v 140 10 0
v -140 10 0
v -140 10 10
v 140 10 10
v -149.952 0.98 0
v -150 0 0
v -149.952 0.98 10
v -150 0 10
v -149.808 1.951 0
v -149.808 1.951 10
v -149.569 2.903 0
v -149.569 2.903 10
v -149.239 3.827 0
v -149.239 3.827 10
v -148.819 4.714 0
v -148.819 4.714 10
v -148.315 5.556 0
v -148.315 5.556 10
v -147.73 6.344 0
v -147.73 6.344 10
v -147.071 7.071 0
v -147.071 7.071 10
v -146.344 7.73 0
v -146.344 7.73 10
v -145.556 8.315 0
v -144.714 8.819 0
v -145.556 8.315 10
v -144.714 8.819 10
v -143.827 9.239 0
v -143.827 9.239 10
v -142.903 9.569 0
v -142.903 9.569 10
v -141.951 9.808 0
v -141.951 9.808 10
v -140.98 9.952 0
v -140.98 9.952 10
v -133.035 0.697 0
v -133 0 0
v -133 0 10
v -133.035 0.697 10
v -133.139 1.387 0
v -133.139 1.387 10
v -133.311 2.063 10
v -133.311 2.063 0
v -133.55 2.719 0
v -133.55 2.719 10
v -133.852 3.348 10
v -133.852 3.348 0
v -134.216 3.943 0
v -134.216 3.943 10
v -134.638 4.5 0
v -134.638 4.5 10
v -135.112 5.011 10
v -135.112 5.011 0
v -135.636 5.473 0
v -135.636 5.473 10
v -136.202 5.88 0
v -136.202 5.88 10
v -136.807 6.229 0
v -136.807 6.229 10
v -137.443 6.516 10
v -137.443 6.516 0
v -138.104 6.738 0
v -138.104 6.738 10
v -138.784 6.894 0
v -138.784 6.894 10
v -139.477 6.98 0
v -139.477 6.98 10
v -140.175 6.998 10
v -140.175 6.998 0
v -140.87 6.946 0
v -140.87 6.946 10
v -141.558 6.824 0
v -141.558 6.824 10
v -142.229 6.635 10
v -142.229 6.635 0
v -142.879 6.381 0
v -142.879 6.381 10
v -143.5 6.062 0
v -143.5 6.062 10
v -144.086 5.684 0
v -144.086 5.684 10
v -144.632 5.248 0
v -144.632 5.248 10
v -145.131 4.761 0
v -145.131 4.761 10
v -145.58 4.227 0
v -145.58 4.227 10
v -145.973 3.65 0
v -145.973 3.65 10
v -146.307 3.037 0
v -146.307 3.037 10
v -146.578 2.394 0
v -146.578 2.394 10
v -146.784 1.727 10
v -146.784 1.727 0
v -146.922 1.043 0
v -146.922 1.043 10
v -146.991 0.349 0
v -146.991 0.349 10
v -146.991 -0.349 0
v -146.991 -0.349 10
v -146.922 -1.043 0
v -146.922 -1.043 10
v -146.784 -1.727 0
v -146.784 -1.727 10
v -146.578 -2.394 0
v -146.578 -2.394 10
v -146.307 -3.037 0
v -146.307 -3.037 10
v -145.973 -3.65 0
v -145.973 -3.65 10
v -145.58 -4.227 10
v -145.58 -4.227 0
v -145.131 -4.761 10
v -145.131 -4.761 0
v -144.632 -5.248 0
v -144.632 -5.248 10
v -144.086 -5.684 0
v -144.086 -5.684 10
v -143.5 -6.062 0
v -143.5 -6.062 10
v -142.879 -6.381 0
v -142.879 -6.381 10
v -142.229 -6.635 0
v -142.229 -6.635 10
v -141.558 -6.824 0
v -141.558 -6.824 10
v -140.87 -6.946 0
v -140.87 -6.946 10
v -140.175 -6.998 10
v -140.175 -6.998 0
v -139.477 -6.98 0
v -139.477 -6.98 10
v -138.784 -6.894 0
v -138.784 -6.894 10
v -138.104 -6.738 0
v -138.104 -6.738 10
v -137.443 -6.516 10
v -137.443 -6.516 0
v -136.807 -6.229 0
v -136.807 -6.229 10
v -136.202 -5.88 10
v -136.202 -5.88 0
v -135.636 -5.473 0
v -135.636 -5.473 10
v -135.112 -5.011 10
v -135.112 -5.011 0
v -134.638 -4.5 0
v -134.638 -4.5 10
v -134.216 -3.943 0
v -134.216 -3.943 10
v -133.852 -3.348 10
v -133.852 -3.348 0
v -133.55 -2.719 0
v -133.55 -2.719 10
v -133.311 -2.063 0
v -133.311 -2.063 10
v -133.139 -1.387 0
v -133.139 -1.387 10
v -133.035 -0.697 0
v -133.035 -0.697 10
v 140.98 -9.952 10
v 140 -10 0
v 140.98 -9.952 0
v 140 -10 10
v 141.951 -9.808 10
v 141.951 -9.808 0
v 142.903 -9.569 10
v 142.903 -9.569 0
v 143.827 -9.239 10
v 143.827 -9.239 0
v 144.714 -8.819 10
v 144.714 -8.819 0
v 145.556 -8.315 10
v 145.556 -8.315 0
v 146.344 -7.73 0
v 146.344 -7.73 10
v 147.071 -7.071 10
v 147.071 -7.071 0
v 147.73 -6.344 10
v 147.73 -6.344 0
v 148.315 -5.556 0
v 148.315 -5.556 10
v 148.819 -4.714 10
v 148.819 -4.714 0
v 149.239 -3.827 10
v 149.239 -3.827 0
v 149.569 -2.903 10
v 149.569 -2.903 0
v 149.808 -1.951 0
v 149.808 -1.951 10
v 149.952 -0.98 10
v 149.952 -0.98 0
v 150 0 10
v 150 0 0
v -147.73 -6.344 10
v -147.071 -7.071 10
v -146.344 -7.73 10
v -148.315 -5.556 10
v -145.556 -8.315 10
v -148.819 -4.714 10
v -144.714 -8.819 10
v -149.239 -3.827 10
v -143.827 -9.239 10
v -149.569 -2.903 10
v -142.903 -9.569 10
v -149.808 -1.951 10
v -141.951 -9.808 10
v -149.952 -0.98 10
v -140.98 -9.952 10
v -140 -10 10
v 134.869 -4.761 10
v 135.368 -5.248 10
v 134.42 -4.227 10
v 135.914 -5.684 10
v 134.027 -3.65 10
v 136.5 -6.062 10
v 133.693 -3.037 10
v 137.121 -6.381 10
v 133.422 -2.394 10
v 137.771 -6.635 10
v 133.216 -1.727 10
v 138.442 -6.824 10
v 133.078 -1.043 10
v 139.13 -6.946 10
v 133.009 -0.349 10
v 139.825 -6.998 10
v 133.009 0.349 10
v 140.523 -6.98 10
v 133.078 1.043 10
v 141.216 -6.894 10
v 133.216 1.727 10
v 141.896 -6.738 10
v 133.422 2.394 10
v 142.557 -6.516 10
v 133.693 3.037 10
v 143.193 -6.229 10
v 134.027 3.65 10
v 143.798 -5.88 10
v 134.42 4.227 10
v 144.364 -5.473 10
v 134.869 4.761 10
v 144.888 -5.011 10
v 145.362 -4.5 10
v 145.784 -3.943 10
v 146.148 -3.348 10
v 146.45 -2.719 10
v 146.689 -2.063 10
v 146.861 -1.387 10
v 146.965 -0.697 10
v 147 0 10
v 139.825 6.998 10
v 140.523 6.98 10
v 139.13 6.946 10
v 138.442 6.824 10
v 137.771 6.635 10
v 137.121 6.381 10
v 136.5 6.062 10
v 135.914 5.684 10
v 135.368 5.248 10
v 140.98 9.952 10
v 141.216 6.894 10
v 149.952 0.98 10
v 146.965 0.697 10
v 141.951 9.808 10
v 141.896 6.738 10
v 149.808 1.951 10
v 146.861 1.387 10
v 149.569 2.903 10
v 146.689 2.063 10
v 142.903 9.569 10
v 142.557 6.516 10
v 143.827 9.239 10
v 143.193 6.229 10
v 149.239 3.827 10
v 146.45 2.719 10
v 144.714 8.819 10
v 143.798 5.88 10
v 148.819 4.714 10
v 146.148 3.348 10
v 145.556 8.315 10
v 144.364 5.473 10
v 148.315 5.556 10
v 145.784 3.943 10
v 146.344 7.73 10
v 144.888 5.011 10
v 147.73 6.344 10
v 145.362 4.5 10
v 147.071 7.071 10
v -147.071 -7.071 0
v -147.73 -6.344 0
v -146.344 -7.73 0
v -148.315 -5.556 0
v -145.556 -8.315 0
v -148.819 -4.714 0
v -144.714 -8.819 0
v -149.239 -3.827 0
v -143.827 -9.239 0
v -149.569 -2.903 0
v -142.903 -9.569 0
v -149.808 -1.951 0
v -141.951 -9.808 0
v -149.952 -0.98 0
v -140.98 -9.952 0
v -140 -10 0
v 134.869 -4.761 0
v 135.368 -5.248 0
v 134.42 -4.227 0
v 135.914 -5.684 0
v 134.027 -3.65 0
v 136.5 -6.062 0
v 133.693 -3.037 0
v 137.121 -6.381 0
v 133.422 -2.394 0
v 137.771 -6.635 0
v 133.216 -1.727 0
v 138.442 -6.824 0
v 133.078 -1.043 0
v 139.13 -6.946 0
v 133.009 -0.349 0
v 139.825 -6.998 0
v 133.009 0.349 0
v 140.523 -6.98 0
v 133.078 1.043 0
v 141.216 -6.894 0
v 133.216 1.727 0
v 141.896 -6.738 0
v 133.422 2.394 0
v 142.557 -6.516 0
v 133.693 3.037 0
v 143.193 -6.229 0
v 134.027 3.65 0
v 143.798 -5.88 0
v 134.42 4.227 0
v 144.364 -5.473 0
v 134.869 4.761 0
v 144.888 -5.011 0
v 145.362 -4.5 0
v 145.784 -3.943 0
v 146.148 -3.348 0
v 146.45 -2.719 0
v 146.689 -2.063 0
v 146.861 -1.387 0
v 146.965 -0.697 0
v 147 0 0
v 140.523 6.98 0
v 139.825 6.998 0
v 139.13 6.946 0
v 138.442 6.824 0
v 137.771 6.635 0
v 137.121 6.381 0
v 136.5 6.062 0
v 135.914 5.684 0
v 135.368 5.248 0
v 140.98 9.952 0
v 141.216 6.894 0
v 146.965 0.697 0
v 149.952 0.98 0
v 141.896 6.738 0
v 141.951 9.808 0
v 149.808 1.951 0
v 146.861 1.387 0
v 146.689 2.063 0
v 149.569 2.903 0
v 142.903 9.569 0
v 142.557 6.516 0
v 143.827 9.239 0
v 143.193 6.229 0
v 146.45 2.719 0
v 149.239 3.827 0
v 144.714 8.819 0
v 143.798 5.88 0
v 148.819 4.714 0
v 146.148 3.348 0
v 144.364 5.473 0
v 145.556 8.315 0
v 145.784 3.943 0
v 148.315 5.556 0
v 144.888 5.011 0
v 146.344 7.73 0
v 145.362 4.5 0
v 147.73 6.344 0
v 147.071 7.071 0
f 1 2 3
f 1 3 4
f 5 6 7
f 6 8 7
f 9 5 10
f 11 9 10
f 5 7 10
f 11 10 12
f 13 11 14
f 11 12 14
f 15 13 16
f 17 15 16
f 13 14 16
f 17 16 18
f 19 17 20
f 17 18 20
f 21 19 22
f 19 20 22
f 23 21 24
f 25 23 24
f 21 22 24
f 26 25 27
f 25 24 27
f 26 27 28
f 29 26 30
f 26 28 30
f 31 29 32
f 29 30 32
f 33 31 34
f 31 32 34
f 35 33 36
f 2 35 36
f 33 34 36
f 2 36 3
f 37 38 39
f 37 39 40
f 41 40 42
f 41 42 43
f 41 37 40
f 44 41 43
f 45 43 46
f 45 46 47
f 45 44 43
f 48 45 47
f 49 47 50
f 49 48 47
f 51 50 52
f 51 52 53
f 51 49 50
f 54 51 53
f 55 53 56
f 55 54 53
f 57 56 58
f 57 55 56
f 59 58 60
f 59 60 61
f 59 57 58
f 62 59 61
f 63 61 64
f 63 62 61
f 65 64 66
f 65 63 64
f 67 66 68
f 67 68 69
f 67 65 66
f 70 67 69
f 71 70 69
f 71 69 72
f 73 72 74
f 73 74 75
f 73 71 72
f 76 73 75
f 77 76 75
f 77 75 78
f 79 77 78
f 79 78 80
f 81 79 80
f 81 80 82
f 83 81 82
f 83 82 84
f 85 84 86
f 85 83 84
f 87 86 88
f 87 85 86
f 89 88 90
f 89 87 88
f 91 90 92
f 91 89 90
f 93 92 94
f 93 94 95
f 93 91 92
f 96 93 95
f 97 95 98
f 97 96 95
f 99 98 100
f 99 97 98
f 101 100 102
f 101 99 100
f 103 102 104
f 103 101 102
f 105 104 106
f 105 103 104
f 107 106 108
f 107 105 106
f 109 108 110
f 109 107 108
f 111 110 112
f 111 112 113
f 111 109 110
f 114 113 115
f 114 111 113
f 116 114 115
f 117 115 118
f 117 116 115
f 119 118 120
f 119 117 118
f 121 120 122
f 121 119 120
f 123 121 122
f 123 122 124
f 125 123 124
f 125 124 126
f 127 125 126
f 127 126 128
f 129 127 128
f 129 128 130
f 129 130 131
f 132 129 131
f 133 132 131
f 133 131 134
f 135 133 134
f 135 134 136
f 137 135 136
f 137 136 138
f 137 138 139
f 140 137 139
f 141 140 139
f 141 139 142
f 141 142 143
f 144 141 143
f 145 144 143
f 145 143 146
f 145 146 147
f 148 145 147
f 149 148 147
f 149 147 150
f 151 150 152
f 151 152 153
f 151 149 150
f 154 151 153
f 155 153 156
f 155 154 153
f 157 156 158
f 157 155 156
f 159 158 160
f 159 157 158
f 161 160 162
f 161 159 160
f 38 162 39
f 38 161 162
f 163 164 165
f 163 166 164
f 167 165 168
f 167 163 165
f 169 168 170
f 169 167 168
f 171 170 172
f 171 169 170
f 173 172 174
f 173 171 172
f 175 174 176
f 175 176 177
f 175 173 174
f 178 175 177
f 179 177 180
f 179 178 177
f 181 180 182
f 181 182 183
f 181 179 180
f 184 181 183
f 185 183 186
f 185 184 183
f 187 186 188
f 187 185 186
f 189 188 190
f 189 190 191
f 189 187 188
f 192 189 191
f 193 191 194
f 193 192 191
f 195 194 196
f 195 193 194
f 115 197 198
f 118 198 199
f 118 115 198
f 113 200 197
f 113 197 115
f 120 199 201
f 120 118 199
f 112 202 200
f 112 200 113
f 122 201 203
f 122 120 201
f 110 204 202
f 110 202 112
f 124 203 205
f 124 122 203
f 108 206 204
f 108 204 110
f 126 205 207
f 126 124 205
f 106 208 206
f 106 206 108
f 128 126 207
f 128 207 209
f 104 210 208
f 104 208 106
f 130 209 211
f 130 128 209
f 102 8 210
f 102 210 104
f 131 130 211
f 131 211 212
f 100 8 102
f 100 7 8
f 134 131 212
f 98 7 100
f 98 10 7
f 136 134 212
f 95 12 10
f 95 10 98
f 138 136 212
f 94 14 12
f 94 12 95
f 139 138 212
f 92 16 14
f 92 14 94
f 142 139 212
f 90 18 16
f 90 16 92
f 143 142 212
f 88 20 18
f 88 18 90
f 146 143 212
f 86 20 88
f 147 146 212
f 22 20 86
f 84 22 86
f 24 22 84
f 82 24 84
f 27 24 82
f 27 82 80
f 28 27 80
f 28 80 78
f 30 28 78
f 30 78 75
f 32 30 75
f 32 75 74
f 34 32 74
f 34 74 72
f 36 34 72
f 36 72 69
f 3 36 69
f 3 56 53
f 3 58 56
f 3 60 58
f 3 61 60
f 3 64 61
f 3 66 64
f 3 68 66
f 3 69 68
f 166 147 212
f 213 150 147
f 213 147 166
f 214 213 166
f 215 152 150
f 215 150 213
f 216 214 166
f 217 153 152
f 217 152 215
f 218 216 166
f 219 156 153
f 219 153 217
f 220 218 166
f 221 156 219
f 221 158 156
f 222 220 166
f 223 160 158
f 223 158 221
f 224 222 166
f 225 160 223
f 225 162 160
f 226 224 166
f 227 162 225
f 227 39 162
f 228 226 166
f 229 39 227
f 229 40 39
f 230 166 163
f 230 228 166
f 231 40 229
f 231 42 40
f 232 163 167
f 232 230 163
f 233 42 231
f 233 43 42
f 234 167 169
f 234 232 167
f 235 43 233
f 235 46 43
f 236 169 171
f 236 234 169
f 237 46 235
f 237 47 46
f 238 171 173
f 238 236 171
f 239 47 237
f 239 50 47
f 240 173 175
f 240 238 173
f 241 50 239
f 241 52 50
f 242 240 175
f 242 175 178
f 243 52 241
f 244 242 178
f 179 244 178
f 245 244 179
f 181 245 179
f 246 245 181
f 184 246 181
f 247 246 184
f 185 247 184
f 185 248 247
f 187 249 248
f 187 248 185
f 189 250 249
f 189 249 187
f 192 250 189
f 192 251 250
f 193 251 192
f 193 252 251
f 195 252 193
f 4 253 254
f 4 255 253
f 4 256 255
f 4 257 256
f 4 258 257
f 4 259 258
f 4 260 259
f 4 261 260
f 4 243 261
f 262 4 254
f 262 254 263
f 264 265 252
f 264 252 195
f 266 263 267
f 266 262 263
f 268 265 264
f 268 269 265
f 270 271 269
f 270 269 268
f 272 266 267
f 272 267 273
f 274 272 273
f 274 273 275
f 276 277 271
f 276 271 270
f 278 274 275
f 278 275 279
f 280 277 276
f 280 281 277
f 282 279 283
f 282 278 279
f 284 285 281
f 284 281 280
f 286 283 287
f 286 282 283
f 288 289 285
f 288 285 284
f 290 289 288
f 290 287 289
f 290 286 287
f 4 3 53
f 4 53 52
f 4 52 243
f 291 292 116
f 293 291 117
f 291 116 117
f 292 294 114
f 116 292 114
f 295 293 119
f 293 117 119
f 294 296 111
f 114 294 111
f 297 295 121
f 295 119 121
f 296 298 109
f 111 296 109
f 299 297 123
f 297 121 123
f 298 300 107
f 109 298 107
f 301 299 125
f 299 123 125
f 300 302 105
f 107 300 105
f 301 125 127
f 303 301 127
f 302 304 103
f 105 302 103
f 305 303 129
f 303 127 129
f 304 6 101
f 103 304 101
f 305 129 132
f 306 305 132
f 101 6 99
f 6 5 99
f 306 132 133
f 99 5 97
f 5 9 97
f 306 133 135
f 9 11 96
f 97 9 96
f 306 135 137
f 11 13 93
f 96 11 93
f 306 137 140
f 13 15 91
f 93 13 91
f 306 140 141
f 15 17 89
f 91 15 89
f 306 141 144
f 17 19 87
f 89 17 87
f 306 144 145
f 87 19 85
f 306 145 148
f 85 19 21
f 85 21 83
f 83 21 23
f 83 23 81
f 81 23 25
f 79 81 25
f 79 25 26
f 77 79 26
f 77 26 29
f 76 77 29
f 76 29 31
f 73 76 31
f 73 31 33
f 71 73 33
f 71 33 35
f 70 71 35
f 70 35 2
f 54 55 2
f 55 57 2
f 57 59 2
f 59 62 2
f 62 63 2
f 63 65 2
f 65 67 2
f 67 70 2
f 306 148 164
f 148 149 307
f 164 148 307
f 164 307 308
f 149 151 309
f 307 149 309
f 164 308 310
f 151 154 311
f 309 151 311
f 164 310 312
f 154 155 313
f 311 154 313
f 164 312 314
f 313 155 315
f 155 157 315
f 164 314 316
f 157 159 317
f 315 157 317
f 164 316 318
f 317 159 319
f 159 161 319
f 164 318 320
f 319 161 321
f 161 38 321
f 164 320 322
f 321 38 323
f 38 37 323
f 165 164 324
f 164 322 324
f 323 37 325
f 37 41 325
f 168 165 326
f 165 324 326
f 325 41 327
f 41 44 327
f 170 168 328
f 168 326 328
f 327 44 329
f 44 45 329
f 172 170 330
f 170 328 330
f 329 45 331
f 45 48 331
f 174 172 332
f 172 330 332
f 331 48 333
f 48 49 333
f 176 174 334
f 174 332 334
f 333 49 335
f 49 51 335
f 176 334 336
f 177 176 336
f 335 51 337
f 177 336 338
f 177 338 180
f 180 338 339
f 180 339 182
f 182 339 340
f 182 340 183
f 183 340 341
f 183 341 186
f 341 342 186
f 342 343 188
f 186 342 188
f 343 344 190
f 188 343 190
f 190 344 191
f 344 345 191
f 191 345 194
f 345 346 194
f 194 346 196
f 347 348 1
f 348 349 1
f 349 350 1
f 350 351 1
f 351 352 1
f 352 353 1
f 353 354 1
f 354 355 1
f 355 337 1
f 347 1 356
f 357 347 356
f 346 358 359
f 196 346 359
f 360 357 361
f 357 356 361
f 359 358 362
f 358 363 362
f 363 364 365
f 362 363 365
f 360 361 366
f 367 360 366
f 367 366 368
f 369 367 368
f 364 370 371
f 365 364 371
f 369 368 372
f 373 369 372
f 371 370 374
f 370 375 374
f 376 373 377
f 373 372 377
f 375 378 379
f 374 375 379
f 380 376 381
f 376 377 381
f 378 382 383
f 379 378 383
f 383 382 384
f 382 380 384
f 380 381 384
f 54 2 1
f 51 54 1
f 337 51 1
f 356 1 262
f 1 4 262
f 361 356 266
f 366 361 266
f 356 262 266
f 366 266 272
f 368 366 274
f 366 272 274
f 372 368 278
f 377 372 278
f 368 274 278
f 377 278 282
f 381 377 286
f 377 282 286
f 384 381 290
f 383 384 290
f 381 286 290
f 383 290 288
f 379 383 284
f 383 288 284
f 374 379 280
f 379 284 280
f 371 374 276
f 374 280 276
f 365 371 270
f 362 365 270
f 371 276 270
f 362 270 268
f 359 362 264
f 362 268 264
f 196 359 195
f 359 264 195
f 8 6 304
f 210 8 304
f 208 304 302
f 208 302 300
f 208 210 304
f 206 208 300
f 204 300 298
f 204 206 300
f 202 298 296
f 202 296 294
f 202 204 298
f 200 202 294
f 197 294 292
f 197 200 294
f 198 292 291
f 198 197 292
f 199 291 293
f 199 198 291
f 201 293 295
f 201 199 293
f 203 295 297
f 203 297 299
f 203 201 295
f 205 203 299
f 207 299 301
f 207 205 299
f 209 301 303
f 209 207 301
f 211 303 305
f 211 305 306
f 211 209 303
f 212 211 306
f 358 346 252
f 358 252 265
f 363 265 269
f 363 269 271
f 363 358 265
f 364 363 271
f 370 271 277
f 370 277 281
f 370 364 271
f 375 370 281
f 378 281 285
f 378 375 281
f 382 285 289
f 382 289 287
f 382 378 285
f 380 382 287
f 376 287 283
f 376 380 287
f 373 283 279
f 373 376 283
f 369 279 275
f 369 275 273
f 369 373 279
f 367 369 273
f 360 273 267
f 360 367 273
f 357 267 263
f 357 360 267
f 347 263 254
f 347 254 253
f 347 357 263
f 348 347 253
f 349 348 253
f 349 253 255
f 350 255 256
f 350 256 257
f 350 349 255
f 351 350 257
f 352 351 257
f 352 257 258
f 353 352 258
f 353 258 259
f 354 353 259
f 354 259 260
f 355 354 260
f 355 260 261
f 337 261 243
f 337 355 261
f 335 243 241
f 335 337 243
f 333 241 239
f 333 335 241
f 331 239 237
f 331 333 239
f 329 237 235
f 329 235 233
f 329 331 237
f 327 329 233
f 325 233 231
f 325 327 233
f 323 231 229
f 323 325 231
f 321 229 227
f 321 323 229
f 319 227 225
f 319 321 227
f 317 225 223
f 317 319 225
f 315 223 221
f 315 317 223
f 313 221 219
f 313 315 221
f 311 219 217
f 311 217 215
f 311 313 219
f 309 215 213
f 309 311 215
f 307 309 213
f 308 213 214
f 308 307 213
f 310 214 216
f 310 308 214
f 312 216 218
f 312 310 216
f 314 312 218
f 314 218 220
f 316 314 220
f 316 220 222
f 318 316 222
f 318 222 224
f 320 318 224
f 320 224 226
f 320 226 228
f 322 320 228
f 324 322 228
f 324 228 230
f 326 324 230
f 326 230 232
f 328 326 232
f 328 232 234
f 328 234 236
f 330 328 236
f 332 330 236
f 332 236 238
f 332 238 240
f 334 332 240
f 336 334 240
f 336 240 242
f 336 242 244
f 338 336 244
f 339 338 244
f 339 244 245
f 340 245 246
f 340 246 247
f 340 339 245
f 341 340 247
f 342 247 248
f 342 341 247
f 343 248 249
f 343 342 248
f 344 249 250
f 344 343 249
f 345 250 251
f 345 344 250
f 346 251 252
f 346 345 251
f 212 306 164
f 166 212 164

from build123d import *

# Parameters (mm, degrees)
SKETCH_1_W      = 300
SKETCH_1_H      = 20
SKETCH_1_R      = 7
EXTRUDE_1_DEPTH = 10
FILLET_1_R      = 10


with BuildPart() as part:
    # 草图1 → 凸台-拉伸1 (new body)
    with BuildSketch(Plane.XY):
        Rectangle(SKETCH_1_W, SKETCH_1_H)
        with Locations((-140, 0)):
            Circle(SKETCH_1_R, mode=Mode.SUBTRACT)
        with Locations((140, 0)):
            Circle(SKETCH_1_R, mode=Mode.SUBTRACT)
    extrude(amount=EXTRUDE_1_DEPTH)

    # 圆角1
    fillet_1_edges = [part.edges().sort_by_distance(p)[0] for p in [
        (150, 10, 5),
        (150, -10, 5),
        (-150, -10, 5),
        (-150, 10, 5),
    ]]
    fillet(fillet_1_edges, radius=FILLET_1_R - 0.0001)  # a hair under: the kernel refuses the full size


solid = part.part
